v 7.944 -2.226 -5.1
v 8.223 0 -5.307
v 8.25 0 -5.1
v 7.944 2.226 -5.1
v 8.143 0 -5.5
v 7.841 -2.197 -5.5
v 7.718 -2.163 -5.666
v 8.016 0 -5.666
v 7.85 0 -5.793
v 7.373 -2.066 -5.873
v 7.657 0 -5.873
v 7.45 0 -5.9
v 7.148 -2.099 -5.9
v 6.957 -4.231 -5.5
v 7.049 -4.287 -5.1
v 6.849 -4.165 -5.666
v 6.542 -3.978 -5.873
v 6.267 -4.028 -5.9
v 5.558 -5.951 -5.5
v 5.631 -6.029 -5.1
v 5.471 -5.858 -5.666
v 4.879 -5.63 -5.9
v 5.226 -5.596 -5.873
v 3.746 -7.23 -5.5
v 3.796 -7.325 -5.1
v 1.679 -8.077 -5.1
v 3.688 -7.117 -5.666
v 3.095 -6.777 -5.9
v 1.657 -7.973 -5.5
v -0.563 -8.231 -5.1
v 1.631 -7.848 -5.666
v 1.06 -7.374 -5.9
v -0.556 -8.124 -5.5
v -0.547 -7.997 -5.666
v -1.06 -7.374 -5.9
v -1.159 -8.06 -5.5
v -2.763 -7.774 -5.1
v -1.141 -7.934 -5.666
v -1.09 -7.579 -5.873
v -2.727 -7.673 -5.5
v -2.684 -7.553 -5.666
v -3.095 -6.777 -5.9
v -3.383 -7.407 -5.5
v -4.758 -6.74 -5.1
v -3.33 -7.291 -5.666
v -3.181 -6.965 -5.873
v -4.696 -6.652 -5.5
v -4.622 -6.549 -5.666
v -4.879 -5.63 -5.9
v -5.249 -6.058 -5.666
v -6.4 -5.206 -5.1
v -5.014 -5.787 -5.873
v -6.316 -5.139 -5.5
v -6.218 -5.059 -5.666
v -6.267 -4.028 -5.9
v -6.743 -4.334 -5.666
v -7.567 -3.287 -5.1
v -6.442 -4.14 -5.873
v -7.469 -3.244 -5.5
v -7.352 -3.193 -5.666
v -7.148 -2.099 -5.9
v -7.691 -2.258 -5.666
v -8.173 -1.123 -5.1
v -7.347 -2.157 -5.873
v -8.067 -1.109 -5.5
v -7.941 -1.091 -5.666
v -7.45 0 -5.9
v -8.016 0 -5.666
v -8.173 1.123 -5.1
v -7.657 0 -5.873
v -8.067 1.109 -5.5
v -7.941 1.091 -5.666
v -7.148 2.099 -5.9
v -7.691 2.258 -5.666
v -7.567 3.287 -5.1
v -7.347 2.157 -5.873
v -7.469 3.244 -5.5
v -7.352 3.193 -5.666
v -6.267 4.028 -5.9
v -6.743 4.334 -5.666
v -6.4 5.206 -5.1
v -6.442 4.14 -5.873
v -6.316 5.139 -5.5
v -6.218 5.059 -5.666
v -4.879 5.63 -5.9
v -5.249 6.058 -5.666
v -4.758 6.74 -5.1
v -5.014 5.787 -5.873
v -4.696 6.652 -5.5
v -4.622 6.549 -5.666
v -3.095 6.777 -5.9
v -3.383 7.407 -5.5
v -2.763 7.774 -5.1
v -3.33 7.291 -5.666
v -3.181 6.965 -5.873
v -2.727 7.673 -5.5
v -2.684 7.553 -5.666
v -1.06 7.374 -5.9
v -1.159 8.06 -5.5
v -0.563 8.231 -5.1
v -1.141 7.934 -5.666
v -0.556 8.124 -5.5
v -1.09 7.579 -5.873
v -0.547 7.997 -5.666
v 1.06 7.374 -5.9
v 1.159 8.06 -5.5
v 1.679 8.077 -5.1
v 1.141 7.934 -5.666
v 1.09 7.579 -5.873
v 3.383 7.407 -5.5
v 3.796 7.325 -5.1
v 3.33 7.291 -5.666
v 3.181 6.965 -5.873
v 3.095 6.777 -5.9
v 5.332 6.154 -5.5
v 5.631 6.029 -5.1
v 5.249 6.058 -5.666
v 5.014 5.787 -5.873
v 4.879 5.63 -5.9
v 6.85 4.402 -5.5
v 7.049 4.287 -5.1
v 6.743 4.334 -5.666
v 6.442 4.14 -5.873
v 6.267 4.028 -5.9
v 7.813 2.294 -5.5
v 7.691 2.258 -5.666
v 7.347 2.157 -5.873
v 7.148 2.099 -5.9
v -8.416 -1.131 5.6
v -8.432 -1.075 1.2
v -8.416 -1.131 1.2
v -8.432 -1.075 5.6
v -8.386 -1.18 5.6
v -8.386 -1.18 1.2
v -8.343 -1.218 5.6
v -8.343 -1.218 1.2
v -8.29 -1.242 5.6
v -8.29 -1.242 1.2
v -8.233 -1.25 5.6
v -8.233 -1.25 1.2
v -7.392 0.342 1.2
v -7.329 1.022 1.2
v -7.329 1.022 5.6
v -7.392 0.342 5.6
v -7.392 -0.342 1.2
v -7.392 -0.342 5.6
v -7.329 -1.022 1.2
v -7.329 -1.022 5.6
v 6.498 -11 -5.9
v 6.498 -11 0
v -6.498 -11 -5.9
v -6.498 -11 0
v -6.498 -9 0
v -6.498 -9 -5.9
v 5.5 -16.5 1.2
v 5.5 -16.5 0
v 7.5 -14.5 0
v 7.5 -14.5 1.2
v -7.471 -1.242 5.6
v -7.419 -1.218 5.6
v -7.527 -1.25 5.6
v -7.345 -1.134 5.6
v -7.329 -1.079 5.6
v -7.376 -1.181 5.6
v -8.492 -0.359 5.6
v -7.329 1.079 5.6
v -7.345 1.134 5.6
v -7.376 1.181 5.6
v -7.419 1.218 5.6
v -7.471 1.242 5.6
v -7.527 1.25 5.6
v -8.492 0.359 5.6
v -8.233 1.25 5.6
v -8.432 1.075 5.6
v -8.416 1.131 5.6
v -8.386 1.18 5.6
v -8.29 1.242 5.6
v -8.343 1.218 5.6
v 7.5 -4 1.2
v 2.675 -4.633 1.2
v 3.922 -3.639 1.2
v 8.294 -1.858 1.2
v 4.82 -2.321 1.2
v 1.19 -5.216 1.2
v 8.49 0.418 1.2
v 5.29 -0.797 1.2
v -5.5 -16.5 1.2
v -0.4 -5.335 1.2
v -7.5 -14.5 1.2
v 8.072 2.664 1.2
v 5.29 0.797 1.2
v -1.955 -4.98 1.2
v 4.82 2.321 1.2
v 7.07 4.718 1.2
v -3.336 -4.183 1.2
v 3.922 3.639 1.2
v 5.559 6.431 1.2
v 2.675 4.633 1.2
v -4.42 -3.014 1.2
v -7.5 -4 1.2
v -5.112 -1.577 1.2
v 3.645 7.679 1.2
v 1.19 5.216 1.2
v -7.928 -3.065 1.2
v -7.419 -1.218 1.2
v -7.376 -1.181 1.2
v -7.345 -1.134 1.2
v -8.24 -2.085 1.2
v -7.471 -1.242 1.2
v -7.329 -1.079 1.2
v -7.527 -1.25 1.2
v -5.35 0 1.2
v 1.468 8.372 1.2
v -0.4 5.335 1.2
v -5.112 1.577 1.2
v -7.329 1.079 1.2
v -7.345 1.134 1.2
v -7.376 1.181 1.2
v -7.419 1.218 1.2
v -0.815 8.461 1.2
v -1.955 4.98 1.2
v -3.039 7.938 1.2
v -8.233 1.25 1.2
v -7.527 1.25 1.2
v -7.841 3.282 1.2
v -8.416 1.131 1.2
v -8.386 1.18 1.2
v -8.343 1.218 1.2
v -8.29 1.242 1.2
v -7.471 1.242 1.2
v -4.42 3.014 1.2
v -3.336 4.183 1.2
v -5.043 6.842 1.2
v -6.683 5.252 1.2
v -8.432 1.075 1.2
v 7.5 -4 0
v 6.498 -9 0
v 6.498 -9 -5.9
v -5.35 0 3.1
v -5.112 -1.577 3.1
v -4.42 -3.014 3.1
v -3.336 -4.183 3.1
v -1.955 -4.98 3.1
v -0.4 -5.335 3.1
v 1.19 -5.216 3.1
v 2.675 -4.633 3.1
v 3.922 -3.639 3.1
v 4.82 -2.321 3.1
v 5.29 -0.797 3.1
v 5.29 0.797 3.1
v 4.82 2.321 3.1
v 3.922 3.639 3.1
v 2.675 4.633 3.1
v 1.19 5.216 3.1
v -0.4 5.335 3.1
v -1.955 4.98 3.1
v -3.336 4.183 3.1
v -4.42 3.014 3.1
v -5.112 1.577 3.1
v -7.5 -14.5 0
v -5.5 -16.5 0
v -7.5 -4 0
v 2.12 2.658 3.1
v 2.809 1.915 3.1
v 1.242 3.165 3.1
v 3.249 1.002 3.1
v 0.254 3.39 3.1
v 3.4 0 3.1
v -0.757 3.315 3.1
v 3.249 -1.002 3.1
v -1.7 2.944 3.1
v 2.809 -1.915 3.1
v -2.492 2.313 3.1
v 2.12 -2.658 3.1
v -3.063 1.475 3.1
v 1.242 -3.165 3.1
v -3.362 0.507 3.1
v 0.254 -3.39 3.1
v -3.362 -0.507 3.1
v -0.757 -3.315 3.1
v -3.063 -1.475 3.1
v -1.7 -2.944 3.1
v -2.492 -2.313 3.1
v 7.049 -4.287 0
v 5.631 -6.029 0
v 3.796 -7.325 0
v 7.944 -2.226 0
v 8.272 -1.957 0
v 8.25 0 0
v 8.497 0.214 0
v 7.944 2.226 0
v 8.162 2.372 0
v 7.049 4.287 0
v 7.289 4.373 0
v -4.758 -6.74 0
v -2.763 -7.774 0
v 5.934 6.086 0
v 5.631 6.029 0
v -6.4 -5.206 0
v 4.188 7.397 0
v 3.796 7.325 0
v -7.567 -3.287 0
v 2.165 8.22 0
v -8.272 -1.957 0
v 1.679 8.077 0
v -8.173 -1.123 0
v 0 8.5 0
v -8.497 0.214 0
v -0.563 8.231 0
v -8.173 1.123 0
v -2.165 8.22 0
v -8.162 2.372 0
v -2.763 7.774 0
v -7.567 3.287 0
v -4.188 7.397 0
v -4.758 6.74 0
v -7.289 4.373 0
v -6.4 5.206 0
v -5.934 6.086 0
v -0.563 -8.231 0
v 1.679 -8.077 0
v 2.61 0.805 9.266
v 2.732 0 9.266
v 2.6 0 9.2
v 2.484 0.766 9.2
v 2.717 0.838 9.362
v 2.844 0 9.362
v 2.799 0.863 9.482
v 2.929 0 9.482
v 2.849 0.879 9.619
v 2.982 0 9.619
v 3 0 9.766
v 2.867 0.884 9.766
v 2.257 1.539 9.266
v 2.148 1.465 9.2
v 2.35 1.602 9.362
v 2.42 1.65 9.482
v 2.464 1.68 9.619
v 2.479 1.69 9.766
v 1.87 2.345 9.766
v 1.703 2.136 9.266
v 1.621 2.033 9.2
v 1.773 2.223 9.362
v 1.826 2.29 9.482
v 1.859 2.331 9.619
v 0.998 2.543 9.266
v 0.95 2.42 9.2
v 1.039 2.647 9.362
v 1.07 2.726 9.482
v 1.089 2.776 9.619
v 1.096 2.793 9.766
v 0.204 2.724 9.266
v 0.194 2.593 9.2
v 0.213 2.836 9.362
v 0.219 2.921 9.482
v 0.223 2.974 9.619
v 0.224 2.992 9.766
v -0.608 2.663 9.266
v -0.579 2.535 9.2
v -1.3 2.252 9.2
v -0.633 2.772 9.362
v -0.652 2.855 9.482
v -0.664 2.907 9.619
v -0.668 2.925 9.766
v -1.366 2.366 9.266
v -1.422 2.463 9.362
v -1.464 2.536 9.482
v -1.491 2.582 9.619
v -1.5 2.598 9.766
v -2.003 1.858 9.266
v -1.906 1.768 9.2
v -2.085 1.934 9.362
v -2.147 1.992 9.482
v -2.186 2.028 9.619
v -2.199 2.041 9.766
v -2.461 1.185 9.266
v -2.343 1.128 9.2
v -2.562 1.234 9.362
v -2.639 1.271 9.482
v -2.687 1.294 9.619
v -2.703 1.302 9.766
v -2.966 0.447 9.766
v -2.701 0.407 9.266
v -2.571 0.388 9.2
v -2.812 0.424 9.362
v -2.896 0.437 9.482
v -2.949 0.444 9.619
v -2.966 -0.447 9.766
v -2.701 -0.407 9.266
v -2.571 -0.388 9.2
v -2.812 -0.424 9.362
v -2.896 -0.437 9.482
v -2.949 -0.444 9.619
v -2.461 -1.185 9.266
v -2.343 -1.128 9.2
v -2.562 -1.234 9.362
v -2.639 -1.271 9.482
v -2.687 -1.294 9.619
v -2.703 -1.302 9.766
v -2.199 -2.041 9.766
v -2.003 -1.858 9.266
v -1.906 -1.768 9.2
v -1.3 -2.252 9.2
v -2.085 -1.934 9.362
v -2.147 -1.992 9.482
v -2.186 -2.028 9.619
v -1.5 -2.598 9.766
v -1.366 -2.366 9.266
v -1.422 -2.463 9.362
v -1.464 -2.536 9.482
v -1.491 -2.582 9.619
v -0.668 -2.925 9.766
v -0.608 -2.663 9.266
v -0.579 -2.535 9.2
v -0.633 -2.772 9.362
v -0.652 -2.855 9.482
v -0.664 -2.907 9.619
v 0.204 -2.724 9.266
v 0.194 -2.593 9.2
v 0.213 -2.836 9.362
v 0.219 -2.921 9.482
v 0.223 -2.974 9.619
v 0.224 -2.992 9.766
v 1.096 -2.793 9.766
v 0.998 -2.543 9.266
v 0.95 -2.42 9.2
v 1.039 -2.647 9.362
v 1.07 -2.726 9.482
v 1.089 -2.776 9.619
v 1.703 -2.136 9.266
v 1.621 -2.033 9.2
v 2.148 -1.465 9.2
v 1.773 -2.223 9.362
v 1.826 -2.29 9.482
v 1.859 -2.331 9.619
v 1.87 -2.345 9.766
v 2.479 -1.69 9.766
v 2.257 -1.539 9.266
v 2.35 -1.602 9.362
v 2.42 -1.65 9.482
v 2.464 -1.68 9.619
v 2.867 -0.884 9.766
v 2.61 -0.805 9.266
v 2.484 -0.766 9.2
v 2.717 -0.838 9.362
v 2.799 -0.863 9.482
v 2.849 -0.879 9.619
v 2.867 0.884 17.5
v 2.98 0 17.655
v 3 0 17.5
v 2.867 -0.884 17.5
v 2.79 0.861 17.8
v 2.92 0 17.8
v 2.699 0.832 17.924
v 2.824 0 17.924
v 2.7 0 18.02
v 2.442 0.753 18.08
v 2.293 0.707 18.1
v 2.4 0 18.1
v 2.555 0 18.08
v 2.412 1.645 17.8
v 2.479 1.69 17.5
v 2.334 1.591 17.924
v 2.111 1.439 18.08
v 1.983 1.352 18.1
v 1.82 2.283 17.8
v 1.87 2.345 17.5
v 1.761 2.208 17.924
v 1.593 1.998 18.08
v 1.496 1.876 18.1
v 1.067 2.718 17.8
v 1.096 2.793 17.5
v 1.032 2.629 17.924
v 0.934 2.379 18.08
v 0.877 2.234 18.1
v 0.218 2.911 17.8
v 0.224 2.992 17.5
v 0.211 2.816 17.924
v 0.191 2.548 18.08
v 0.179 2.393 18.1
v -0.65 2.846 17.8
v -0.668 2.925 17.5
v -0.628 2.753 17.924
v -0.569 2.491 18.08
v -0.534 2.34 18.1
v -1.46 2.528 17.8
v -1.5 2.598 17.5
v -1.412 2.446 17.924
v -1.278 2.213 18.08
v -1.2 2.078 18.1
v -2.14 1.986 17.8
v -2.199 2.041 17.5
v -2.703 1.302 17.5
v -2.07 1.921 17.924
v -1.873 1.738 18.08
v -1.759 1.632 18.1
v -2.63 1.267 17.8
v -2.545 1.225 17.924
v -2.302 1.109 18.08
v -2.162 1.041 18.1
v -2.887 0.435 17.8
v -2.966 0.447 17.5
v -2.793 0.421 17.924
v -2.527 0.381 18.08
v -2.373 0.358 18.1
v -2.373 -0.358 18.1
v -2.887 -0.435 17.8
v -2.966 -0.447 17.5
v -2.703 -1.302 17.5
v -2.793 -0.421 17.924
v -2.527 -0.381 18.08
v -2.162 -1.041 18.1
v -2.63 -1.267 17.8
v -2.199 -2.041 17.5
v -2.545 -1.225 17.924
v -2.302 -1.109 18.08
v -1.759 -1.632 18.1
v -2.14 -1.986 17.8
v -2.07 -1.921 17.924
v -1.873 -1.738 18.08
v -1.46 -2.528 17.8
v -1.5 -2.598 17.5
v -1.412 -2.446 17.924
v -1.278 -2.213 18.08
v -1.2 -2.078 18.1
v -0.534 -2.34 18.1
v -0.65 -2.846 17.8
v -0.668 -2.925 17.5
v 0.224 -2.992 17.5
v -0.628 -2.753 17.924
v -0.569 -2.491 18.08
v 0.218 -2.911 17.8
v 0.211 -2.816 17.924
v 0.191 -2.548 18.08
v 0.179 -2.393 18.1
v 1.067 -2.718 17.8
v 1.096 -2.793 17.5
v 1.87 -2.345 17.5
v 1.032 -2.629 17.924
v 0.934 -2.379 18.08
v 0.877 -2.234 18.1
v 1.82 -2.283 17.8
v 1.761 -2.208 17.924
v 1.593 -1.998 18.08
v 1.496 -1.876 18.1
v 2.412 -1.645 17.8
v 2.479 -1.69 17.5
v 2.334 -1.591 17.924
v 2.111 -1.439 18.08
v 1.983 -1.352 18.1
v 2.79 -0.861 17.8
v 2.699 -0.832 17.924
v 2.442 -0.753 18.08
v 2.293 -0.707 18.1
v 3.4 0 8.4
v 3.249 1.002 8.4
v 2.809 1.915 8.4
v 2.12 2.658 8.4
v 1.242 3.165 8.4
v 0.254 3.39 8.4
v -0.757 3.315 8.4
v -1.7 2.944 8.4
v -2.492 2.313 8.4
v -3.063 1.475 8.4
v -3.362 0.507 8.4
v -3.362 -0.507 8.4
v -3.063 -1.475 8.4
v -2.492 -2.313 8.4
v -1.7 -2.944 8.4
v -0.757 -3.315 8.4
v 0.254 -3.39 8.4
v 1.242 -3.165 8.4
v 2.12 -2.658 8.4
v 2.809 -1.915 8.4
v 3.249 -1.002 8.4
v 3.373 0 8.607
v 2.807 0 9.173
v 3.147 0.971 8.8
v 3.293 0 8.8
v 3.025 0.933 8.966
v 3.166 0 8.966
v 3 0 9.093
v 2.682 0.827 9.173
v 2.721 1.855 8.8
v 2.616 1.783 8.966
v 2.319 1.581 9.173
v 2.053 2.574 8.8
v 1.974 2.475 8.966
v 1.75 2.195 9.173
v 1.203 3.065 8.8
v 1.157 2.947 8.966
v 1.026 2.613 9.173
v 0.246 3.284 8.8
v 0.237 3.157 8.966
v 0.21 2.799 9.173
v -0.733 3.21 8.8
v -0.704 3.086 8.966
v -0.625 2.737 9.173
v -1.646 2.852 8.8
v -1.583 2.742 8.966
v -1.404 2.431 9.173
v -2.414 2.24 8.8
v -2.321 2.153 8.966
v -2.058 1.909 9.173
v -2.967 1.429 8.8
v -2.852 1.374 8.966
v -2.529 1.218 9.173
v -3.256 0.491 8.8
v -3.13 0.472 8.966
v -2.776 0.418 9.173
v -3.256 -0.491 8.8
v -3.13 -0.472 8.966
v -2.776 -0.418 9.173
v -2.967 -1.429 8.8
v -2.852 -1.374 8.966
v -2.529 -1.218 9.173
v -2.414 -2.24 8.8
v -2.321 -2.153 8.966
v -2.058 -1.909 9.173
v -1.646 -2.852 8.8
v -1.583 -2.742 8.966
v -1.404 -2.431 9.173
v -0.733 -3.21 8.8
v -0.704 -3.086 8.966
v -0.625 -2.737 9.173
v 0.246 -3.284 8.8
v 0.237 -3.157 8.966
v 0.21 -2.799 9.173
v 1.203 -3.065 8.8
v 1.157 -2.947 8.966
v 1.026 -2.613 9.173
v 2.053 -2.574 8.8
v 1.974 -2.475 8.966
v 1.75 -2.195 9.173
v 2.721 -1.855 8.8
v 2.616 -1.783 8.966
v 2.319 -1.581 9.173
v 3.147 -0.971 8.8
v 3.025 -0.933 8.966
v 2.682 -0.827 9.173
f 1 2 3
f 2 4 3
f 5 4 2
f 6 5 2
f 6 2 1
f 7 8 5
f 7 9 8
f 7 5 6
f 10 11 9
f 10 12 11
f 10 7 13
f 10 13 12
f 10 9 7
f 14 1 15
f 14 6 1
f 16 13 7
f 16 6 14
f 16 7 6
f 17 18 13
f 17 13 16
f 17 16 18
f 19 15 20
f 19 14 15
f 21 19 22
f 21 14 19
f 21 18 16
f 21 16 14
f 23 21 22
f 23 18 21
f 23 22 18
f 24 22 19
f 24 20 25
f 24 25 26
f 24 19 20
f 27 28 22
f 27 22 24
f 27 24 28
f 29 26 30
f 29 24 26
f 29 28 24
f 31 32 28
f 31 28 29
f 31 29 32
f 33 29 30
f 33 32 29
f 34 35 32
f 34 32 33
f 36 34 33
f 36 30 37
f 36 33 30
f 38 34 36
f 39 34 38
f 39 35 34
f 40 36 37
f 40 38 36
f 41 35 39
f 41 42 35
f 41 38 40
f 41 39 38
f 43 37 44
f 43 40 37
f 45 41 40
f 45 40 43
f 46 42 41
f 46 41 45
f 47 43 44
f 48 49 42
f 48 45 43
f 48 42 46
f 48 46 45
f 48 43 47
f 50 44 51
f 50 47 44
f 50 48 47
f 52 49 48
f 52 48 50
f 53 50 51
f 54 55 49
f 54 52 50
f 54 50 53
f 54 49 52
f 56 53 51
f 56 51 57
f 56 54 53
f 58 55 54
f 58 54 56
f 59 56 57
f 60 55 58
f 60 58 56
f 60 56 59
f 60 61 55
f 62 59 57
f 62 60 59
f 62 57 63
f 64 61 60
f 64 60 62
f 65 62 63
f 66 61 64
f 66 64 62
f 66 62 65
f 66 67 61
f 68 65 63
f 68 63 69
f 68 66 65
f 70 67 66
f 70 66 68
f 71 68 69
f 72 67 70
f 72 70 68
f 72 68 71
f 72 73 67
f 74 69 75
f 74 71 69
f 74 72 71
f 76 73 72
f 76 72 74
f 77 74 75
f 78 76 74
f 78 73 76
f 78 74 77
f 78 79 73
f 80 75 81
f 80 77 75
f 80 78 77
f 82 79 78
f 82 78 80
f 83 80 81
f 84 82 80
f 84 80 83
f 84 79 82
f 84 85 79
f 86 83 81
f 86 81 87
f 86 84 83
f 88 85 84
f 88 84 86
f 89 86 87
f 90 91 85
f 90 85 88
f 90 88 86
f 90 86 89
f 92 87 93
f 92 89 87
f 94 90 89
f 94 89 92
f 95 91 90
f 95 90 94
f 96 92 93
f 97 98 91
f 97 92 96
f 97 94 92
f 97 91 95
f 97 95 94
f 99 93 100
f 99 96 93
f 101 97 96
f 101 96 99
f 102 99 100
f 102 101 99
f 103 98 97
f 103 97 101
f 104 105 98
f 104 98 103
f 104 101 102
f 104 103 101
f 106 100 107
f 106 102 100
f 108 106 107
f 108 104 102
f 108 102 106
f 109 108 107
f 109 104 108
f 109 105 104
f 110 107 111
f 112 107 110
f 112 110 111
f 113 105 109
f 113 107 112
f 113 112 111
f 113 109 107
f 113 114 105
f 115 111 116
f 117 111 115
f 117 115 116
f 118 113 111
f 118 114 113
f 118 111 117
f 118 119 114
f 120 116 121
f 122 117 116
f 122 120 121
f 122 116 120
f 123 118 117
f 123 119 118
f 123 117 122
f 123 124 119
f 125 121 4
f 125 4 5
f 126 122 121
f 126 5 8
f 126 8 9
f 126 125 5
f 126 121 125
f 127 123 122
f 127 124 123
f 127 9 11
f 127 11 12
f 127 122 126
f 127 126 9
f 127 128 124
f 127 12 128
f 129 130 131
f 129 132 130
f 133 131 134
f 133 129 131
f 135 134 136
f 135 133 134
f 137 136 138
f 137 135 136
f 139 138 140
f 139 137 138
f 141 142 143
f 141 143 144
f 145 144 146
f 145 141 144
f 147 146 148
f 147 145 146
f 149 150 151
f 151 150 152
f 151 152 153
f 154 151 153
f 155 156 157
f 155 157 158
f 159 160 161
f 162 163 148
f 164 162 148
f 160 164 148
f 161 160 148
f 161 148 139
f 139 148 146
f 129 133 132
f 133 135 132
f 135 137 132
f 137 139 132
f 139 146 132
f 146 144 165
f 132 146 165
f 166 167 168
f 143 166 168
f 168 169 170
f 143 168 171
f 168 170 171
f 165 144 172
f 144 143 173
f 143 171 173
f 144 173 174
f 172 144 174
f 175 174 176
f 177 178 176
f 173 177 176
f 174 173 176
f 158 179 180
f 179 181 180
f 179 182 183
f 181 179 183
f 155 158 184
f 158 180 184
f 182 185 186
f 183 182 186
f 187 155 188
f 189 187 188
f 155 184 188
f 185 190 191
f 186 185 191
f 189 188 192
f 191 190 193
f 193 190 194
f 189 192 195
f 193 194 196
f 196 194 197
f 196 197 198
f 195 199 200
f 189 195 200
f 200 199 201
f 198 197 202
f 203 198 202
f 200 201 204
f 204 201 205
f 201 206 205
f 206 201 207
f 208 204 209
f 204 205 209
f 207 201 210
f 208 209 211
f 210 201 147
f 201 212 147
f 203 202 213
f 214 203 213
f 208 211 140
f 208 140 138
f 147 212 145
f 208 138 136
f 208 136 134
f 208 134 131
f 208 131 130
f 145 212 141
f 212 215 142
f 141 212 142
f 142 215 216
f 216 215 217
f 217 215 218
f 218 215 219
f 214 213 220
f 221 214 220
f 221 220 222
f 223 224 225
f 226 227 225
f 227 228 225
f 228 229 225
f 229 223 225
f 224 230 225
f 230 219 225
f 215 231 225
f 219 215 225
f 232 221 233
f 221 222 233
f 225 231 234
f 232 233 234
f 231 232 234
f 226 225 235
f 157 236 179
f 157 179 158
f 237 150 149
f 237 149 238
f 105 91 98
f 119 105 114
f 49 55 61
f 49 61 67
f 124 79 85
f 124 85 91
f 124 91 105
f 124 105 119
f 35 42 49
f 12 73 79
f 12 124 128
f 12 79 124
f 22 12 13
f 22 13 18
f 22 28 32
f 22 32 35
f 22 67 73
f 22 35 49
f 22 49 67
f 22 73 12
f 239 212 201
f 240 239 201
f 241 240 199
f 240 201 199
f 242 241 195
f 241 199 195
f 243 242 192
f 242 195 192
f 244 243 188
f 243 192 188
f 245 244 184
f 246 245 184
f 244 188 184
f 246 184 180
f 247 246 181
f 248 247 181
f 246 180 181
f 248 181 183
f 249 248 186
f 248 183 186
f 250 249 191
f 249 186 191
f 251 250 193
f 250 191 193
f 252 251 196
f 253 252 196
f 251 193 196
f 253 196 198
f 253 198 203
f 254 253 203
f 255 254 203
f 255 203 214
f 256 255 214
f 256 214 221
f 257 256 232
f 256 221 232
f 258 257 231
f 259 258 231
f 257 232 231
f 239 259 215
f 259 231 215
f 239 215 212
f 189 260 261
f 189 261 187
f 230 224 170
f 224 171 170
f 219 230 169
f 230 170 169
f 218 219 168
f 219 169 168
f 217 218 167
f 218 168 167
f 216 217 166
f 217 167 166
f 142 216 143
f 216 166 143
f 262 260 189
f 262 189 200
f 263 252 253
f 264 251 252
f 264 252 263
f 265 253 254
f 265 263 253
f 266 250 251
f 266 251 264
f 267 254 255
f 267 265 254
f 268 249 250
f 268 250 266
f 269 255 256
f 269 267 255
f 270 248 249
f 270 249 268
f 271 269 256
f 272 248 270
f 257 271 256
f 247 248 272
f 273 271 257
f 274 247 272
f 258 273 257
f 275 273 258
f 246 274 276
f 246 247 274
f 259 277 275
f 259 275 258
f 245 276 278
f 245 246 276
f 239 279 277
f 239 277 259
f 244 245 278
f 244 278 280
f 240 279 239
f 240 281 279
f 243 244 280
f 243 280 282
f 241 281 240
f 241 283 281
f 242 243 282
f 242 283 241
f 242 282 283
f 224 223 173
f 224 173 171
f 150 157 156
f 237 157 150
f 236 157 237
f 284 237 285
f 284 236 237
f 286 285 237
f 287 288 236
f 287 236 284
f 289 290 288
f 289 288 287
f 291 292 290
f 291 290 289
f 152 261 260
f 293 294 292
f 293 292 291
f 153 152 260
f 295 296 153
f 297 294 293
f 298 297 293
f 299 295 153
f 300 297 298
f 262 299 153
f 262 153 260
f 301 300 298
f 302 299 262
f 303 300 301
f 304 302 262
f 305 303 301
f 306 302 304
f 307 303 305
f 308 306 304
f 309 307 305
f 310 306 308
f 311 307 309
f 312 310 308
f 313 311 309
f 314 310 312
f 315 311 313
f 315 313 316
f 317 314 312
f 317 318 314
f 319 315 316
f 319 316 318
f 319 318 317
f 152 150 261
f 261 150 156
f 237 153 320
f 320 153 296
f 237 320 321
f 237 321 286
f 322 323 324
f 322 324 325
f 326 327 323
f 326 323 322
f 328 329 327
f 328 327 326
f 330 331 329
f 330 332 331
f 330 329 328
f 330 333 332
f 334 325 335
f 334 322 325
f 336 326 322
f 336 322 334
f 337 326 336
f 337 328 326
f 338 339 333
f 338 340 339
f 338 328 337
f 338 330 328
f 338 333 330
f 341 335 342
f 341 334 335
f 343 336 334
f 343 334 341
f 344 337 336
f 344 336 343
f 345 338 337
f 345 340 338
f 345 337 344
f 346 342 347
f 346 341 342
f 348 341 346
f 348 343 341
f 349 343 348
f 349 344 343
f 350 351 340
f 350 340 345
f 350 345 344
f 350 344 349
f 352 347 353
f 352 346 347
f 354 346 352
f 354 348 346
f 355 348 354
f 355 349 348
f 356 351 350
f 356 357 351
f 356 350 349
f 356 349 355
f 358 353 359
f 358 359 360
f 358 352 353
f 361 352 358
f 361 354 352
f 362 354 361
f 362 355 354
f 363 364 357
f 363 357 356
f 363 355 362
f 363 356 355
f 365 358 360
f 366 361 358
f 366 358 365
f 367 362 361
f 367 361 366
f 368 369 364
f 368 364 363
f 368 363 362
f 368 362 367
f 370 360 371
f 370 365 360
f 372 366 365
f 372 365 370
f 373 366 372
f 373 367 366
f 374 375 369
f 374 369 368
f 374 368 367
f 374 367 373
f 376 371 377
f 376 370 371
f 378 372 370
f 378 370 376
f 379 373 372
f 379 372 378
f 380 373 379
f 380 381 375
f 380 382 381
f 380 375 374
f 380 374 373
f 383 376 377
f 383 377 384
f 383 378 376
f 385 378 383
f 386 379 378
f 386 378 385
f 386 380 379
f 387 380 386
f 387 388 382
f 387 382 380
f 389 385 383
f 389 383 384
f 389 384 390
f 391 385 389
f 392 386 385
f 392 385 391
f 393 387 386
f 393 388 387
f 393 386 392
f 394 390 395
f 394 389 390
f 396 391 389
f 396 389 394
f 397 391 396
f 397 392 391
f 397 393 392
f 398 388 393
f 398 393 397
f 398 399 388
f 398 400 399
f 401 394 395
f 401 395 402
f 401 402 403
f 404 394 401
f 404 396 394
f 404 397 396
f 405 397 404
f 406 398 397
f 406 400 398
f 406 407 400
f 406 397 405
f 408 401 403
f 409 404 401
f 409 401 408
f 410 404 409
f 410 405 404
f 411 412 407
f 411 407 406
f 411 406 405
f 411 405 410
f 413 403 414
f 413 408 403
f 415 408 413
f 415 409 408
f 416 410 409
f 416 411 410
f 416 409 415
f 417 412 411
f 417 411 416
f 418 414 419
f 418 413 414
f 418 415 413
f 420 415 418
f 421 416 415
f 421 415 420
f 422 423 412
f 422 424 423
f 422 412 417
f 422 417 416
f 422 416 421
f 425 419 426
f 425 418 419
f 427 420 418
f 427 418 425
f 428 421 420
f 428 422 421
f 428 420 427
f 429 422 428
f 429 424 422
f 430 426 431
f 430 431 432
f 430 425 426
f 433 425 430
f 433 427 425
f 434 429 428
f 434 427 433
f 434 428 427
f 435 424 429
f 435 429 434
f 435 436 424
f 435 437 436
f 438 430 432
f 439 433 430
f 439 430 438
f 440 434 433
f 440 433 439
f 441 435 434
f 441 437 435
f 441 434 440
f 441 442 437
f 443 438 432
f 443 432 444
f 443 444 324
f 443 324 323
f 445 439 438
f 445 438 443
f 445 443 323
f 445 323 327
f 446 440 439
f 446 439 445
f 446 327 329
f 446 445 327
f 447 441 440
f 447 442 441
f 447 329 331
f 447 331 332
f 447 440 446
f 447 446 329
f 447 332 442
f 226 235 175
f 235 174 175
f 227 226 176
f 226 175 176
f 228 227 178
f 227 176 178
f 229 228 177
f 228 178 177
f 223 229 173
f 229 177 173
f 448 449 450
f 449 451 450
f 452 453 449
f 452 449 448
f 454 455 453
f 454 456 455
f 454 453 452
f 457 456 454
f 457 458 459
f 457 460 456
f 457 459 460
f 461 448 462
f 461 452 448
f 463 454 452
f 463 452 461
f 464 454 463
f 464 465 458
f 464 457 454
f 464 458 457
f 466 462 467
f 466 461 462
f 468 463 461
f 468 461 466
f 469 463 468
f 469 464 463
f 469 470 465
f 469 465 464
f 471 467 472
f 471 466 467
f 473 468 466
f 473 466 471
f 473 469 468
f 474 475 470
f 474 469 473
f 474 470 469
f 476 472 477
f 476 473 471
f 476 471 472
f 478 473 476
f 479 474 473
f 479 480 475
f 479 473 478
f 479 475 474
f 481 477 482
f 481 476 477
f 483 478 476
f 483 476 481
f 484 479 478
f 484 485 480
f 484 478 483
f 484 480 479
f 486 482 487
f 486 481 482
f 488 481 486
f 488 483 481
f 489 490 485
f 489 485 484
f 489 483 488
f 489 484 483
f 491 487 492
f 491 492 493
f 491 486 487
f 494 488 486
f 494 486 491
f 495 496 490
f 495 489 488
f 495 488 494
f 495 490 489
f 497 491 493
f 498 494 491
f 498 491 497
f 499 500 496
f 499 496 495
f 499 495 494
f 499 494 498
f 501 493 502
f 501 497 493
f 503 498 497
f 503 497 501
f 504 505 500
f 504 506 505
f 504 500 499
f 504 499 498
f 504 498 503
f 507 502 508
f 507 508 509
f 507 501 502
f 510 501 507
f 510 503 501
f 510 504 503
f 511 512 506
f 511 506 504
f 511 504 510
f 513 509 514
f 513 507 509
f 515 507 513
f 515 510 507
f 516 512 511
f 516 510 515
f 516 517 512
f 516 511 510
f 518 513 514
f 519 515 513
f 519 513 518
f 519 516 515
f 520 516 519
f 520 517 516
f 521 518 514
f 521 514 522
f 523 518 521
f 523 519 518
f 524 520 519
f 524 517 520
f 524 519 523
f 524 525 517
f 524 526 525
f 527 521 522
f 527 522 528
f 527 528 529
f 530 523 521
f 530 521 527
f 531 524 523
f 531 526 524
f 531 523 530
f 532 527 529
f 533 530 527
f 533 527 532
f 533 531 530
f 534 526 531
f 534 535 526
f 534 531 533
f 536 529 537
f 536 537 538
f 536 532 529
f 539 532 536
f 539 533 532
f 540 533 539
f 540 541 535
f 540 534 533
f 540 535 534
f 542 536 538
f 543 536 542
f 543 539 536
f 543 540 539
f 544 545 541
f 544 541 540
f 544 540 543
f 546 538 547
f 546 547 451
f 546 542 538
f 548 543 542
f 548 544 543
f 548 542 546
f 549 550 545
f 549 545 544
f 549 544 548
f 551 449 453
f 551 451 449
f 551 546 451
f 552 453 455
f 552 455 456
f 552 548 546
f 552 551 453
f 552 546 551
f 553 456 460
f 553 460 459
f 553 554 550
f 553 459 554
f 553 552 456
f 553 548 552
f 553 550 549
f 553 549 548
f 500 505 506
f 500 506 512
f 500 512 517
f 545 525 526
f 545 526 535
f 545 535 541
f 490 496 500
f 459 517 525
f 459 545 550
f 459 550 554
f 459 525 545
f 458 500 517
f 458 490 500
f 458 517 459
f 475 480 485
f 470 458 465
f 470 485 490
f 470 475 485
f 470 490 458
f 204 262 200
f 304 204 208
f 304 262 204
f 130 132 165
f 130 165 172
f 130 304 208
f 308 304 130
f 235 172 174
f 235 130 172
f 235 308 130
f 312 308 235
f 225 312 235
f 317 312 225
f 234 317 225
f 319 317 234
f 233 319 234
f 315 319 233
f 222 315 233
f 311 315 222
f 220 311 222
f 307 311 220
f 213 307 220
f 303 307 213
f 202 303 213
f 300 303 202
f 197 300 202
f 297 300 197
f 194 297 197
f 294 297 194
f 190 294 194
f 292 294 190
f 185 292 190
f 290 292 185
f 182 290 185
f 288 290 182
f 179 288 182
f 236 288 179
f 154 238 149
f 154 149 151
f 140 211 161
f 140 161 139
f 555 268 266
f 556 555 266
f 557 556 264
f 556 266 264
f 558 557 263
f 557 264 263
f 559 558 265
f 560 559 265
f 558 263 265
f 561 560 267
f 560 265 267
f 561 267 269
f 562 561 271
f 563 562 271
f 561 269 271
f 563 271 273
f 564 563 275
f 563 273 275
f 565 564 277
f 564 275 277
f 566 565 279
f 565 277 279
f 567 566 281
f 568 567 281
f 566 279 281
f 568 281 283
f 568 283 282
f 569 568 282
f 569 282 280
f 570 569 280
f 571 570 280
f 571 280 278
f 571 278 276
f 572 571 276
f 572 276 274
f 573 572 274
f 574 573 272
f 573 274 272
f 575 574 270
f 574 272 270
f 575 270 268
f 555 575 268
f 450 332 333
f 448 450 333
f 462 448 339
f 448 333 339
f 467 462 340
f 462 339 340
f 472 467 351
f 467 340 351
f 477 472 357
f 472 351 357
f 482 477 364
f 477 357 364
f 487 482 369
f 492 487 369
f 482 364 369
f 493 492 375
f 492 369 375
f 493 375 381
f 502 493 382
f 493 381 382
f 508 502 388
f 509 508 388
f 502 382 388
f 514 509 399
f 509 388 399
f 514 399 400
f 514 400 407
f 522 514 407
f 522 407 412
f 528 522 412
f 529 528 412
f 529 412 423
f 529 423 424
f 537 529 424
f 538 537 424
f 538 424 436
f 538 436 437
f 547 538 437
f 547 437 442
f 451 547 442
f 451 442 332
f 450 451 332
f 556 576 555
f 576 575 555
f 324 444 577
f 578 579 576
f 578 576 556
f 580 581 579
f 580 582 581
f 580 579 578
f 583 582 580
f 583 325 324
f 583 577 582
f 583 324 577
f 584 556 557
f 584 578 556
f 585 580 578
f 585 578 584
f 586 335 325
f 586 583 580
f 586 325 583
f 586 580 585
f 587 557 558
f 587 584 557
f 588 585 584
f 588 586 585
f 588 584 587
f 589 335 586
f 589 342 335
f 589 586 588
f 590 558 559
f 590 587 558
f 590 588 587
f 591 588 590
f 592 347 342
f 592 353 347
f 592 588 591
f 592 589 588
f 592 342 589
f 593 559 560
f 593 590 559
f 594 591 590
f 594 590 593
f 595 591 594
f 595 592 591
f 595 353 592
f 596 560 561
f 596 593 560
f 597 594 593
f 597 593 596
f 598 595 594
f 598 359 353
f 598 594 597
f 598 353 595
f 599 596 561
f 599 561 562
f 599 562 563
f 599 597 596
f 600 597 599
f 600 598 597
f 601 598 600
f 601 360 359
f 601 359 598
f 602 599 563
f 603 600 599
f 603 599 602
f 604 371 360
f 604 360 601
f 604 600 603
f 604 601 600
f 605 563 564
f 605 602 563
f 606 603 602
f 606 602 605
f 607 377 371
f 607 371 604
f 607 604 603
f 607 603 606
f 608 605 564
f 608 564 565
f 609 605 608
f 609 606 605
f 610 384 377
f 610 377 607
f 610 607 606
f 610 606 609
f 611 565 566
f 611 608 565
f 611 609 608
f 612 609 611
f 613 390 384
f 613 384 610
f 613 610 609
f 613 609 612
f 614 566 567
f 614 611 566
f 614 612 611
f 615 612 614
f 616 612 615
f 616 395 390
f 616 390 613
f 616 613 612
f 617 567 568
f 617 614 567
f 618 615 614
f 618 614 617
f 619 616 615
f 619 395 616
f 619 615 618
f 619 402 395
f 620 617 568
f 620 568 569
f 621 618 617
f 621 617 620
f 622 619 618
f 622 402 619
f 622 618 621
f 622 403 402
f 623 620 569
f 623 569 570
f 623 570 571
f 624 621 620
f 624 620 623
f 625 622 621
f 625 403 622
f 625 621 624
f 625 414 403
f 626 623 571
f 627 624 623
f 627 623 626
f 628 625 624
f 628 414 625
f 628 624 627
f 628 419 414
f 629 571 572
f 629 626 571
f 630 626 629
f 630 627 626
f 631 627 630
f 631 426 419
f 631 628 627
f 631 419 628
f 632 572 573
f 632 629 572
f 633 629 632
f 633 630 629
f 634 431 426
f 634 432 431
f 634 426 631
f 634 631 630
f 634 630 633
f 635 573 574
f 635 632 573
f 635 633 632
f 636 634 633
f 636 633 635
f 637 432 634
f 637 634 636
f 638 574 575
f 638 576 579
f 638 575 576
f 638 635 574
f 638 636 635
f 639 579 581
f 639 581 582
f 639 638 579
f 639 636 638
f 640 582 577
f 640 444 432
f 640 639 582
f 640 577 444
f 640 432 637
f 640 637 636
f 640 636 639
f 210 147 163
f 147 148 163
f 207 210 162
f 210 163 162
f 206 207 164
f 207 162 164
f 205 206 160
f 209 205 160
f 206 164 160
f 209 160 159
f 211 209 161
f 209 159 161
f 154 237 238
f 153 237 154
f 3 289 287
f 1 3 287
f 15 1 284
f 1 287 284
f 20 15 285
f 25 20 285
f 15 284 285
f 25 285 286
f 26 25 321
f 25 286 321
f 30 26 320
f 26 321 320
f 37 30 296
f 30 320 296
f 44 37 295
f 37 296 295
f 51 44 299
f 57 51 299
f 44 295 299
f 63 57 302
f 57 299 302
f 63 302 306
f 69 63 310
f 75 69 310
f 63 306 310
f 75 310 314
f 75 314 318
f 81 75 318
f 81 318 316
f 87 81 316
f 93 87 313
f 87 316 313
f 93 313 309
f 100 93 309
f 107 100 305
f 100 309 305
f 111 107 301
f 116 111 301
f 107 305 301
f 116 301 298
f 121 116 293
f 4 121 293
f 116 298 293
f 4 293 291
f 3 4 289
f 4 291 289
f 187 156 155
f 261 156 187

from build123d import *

# Parameters (mm, degrees)
BOSS_EXTRUDE1_DEPTH = 1.2
SKETCH2_R           = 5.35
BOSS_EXTRUDE2_DEPTH = 1.9
SKETCH3_R           = 3.4
BOSS_EXTRUDE3_DEPTH = 6.1
FILLET2_R           = 0.8
SKETCH4_R           = 3
BOSS_EXTRUDE4_DEPTH = 8.9
SKETCH5_R           = 8.25
BOSS_EXTRUDE5_DEPTH = 5.9
FILLET1_R           = 0.8
SKETCH6_W           = 12.99598454
SKETCH6_H           = 2
BOSS_EXTRUDE6_DEPTH = 5.9
FILLET3_R           = 0.6
CHAMFER1_SIZE       = 2
BOSS_EXTRUDE7_DEPTH = 4.4
FILLET4_R           = 0.2


with BuildPart() as part:
    # Sketch1 → Boss-Extrude1 (new body)
    with BuildSketch(Plane.XY):
        with BuildLine():
            Line((7.5, -4), (7.5, -16.5))
            Line((7.5, -16.5), (-7.5, -16.5))
            Line((-7.5, -16.5), (-7.5, -4))
            ThreePointArc((-7.5, -4), (0, 8.5), (7.5, -4))
        make_face()
    extrude(amount=BOSS_EXTRUDE1_DEPTH)

    # Sketch2 → Boss-Extrude2 (add)
    with BuildSketch(Plane.XY.offset(1.2)):
        with Locations(Location((0, 0, 0), (0, 0, 180))):
            Circle(SKETCH2_R)
    extrude(amount=BOSS_EXTRUDE2_DEPTH)

    # Sketch3 → Boss-Extrude3 (add)
    with BuildSketch(Plane.XY.offset(3.1)):
        Circle(SKETCH3_R)
    extrude(amount=BOSS_EXTRUDE3_DEPTH)

    # Fillet2
    fillet2_edges = [part.edges().sort_by_distance(p)[0] for p in [
        (-3.4, 0, 9.2),
    ]]
    fillet(fillet2_edges, radius=FILLET2_R)

    # Sketch4 → Boss-Extrude4 (add)
    with BuildSketch(Plane.XY.offset(9.2)):
        Circle(SKETCH4_R)
    extrude(amount=BOSS_EXTRUDE4_DEPTH)

    # Sketch5 → Boss-Extrude5 (add)
    with BuildSketch(Plane(origin=(0, 0, 0), x_dir=(-1, 0, 0), z_dir=(0, 0, -1))):
        with Locations(Location((0, 0, 0), (0, 0, 180))):
            Circle(SKETCH5_R)
    extrude(amount=BOSS_EXTRUDE5_DEPTH)

    # Fillet1
    fillet1_edges = [part.edges().sort_by_distance(p)[0] for p in [
        (-8.25, 0, -5.9),
    ]]
    fillet(fillet1_edges, radius=FILLET1_R)

    # Sketch6 → Boss-Extrude6 (add)
    with BuildSketch(Plane(origin=(0, 0, 0), x_dir=(-1, 0, 0), z_dir=(0, 0, -1))):
        with Locations((0, -10)):
            Rectangle(SKETCH6_W, SKETCH6_H)
    extrude(amount=BOSS_EXTRUDE6_DEPTH)

    # Fillet3
    # the kernel refuses this fillet: 0.6 mm, written as the material it takes off along each edge
    with BuildSketch(Plane(origin=(0, 0, 9.2), x_dir=(1, 0, 0), z_dir=(0, -1, 0))) as fillet3_piece_1:
        with BuildLine():
            CenterArc((2.4, 0.565685425), FILLET3_R, 289.471220634, 70.528779366)
            Line((3, 0.565685425), (3, 0))
            Line((3, 0), (2.6, 0))
        make_face()
    revolve(axis=Axis((0, 0, 9.2), (0, 0, 1)), mode=Mode.SUBTRACT)
    with BuildSketch(Plane(origin=(0, 0, 18.1), x_dir=(1, 0, 0), z_dir=(0, -1, 0))) as fillet3_piece_2:
        with BuildLine():
            CenterArc((3 - FILLET3_R, -FILLET3_R), FILLET3_R, 0, 90)
            Line((3 - FILLET3_R, 0), (3, 0))
            Line((3, 0), (3, -FILLET3_R))
        make_face()
    revolve(axis=Axis((0, 0, 18.1), (0, 0, 1)), mode=Mode.SUBTRACT)

    # Chamfer1
    chamfer1_edges = [part.edges().sort_by_distance(p)[0] for p in [
        (7.5, -16.5, 0.6),
        (-7.5, -16.5, 0.6),
    ]]
    chamfer(chamfer1_edges, length=CHAMFER1_SIZE)

    # Sketch8 → Boss-Extrude7 (add)
    with BuildSketch(Plane.XY.offset(1.2)):
        with BuildLine():
            Line((-8.40758586, 1.25), (-7.293661632, 1.25))
            ThreePointArc((-7.293661632, 1.25), (-7.4, 0), (-7.293661632, -1.25))
            Line((-7.293661632, -1.25), (-8.40758586, -1.25))
            ThreePointArc((-8.40758586, -1.25), (-8.5, 0), (-8.40758586, 1.25))
        make_face()
    extrude(amount=BOSS_EXTRUDE7_DEPTH)

    # Fillet4
    fillet4_edges = [part.edges().sort_by_distance(p)[0] for p in [
        (-8.40758586, 1.25, 3.4),
        (-8.40758586, -1.25, 3.4),
        (-7.293661632, -1.25, 3.4),
        (-7.293661632, 1.25, 3.4),
    ]]
    fillet(fillet4_edges, radius=FILLET4_R)


solid = part.part
